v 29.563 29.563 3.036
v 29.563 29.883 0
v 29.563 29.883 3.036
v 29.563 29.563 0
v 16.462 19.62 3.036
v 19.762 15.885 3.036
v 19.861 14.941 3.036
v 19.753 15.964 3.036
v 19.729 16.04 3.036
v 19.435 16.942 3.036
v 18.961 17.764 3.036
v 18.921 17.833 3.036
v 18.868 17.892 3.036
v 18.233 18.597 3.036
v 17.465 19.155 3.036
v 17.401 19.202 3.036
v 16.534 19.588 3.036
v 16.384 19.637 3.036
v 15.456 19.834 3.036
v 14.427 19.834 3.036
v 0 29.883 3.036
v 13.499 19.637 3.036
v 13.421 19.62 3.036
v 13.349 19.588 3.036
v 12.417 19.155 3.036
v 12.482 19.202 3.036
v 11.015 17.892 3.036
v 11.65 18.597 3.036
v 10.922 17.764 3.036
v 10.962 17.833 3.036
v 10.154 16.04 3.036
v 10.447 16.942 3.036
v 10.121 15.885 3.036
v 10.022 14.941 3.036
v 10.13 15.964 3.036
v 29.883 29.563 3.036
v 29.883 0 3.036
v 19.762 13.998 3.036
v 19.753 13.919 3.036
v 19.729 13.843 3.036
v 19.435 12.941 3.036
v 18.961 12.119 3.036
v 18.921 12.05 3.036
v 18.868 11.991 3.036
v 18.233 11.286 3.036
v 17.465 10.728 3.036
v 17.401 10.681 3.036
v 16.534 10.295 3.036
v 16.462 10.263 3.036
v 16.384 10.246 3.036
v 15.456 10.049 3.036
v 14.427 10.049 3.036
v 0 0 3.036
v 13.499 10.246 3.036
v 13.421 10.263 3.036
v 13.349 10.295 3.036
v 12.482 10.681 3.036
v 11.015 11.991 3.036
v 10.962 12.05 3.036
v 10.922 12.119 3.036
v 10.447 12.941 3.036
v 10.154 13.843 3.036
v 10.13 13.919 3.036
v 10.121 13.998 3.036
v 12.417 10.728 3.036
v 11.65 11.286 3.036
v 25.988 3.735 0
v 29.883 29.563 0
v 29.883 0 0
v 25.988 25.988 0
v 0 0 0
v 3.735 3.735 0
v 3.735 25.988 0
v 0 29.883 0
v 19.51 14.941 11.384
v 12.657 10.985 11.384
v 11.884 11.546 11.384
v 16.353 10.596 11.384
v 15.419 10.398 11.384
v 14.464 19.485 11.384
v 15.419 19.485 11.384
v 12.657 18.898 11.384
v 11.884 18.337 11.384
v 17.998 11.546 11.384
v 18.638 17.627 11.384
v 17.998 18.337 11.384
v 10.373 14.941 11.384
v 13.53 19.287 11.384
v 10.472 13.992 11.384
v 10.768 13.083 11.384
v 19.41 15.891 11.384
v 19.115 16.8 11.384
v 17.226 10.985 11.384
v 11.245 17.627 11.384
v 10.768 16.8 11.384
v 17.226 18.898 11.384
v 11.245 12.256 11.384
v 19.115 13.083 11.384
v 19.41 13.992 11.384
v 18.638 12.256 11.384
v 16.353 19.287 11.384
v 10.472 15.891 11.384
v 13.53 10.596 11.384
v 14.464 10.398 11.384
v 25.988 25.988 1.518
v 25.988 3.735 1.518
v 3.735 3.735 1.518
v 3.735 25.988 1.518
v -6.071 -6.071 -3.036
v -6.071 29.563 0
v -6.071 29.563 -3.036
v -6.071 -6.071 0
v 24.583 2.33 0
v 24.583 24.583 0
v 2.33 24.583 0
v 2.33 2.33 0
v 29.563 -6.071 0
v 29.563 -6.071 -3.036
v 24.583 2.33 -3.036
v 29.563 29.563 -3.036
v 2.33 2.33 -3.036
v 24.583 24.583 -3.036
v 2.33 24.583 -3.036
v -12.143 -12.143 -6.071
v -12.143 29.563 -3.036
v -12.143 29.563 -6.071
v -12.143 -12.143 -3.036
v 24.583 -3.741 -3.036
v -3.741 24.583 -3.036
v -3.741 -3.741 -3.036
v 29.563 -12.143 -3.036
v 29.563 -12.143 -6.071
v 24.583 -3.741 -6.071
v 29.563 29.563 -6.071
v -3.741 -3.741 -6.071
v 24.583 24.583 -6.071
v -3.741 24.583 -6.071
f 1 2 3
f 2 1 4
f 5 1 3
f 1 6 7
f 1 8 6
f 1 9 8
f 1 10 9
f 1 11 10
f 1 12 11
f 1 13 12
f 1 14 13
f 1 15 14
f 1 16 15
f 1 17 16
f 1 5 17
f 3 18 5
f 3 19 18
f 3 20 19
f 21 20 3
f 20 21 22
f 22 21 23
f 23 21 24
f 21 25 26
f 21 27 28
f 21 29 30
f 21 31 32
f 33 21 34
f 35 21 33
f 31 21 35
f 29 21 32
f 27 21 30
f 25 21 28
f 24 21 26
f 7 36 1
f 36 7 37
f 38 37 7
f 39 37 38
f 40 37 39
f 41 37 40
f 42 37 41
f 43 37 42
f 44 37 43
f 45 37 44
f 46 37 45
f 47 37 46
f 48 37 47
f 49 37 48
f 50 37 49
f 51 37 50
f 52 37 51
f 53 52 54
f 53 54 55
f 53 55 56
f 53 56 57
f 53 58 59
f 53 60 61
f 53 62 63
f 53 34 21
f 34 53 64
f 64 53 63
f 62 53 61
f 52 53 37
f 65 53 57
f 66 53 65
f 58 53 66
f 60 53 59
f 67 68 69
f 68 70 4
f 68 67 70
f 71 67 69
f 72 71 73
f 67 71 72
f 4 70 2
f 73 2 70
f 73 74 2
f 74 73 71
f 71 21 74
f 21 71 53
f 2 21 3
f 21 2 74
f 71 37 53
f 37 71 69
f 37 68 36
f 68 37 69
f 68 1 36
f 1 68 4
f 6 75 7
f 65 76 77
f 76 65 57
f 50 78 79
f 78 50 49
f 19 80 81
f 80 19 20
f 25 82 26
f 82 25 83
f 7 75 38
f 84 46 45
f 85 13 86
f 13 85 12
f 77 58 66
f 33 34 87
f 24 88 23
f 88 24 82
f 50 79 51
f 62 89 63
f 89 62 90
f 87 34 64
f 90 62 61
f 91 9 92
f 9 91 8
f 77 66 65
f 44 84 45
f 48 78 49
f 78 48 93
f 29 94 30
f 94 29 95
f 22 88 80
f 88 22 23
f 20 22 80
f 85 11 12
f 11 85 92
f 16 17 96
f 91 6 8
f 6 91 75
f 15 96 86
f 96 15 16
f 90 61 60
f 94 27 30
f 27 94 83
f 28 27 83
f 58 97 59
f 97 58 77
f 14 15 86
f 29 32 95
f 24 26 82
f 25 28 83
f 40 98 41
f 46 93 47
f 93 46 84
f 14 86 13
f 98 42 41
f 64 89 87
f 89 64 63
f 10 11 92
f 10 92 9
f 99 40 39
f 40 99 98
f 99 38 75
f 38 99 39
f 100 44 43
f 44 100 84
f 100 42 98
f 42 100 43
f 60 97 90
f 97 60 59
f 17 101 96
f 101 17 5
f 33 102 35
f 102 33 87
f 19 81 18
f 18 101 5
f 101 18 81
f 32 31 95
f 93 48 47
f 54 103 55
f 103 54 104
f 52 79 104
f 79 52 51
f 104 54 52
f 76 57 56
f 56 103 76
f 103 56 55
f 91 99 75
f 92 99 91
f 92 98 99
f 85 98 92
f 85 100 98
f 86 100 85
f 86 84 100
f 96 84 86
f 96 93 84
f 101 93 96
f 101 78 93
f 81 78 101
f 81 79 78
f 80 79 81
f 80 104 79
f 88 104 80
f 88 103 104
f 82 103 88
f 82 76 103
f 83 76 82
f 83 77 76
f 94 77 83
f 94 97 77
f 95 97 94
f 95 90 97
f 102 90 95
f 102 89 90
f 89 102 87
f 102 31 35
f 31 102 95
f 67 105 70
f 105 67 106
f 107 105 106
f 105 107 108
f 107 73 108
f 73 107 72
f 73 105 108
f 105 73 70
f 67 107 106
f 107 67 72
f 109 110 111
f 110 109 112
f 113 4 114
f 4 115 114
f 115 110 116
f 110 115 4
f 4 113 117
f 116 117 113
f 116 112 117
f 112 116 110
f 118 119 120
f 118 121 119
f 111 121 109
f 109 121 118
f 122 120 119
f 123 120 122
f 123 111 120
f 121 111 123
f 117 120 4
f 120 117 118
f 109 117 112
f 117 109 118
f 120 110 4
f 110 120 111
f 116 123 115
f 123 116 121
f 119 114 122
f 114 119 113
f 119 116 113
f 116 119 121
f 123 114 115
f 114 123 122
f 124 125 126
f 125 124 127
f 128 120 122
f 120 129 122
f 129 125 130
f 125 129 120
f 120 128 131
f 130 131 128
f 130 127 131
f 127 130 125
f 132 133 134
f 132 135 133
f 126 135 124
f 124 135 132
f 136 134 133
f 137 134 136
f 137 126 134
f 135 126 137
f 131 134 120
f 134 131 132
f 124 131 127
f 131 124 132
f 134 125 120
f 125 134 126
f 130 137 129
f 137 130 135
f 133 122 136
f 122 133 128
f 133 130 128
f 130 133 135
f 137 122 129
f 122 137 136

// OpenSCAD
coldiameter = 17;
mod = coldiameter;
ch = mod*5;
bo = mod/8; 							// base offset
btr = bo*.625;  							//base torus radius
cbdiameter = mod+(bo*2);			//diameter of column base (for inset)
//b_length = ch/1.618;					//make length a golden rectangle
n_o_c = 6;								//number of columns across front of temple
b_length = ((ch*1.618)*1.618)/(n_o_c-1); 	//comment either this or the other def out before compiiing
//echo (b_length);							//if used, front of temple is golden rectangle
b_width = 2.5*((mod/2)+bo+btr);
b_height = cbdiameter/7;
step_width = b_height * 2;
$fs = 1;


//straight_base();
//translate([0,b_width+15,0]) straight_base();
//steps(2);
//corner_base();
//corner_steps(2);
//step_unit(2);
corner_unit(2);

echo((mod/2)-(bo*1.67));

module corner_unit(flights) {
	corner_base();
	rotate([0,0,180]) translate([-b_length+b_width/2,-b_length+b_width/2,0]) 
		corner_steps(flights);
}

module step_unit(flights) {
	rotate([0,0,180]) translate([-b_length*2+b_width/2,-b_width,0]) 
	 	union() { straight_base(); steps(flights);}
}

module large_corner_unit(flights) {
	rotate([0,0,180]) translate([-b_length*2+b_width/2,-b_width,0]) 
	 	union() { straight_base(); steps(flights);}
	translate([b_width,b_length-b_width/2,0]) rotate([0,0,90]) 
		union() { straight_base(); steps(flights);}
	corner_base();
	rotate([0,0,180]) translate([-b_length+b_width/2,-b_length+b_width/2,0]) 
		corner_steps(flights);
}

module corner_steps(flights) {
for ( i = [1 : flights] ) {
	translate([0,0,-b_height*i])
	difference() {
		cube([b_length-b_width/2+(step_width*i),b_length-b_width/2+(step_width*i),b_height]);
		translate([b_width/6,b_width/6,0])
		cube([b_length-b_length/2+(step_width*(i-1)),b_length-b_length/2+(step_width*(i-1)),b_height+b_height/10]);
	}
	}
}

module steps(flights) {
for ( i = [1 : flights] ) {
	translate([0,0,-b_height*i])
	difference() {
		cube([b_length,(step_width*i)+b_width,b_height]);
		translate([b_length/10,b_width/10,0])
		cube([b_length-b_length/5,b_width-b_width/10+(step_width*(i-1)),b_height+b_height/10]);
	}
//	difference () {
		translate([0,-b_width/3,-b_height*i])  cube([b_length,b_width/3,b_height]);

//	}
	}
}

module corner_base() {
difference() {
	union() {
	cube([b_length-b_width/2,b_width,b_height]);
	cube([b_width, b_length-b_width/2, b_height]);
	translate([b_width/2,b_width/2,b_height*.75])
		cylinder(h=b_height*3,r1=(mod/2)-(bo*1.67),r2=(mod/2)-(bo*1.85));
	}
	translate([b_width/8,b_width/8,0])
		cube([b_length/2,b_length/2,b_height/2]);	
	}
}

module straight_base() {
difference() {
	union() {
	cube([b_length,b_width,b_height]);
	translate([b_length/2,b_width/2,b_height*.75])
		cylinder(h=b_height*3,r1=(mod/2)-(bo*1.67),r2=(mod/2)-(bo*1.85));   //fudge factor
		}
	translate([b_length/20,b_width/5,0])
		cube([b_length/2-(b_length/10),b_width-(2*b_width/5),b_height/2]);
	translate([b_length/20+b_length/2,b_width/5,0])
		cube([b_length/2-(b_length/10),b_width-(2*b_width/5),b_height/2]);}
}
